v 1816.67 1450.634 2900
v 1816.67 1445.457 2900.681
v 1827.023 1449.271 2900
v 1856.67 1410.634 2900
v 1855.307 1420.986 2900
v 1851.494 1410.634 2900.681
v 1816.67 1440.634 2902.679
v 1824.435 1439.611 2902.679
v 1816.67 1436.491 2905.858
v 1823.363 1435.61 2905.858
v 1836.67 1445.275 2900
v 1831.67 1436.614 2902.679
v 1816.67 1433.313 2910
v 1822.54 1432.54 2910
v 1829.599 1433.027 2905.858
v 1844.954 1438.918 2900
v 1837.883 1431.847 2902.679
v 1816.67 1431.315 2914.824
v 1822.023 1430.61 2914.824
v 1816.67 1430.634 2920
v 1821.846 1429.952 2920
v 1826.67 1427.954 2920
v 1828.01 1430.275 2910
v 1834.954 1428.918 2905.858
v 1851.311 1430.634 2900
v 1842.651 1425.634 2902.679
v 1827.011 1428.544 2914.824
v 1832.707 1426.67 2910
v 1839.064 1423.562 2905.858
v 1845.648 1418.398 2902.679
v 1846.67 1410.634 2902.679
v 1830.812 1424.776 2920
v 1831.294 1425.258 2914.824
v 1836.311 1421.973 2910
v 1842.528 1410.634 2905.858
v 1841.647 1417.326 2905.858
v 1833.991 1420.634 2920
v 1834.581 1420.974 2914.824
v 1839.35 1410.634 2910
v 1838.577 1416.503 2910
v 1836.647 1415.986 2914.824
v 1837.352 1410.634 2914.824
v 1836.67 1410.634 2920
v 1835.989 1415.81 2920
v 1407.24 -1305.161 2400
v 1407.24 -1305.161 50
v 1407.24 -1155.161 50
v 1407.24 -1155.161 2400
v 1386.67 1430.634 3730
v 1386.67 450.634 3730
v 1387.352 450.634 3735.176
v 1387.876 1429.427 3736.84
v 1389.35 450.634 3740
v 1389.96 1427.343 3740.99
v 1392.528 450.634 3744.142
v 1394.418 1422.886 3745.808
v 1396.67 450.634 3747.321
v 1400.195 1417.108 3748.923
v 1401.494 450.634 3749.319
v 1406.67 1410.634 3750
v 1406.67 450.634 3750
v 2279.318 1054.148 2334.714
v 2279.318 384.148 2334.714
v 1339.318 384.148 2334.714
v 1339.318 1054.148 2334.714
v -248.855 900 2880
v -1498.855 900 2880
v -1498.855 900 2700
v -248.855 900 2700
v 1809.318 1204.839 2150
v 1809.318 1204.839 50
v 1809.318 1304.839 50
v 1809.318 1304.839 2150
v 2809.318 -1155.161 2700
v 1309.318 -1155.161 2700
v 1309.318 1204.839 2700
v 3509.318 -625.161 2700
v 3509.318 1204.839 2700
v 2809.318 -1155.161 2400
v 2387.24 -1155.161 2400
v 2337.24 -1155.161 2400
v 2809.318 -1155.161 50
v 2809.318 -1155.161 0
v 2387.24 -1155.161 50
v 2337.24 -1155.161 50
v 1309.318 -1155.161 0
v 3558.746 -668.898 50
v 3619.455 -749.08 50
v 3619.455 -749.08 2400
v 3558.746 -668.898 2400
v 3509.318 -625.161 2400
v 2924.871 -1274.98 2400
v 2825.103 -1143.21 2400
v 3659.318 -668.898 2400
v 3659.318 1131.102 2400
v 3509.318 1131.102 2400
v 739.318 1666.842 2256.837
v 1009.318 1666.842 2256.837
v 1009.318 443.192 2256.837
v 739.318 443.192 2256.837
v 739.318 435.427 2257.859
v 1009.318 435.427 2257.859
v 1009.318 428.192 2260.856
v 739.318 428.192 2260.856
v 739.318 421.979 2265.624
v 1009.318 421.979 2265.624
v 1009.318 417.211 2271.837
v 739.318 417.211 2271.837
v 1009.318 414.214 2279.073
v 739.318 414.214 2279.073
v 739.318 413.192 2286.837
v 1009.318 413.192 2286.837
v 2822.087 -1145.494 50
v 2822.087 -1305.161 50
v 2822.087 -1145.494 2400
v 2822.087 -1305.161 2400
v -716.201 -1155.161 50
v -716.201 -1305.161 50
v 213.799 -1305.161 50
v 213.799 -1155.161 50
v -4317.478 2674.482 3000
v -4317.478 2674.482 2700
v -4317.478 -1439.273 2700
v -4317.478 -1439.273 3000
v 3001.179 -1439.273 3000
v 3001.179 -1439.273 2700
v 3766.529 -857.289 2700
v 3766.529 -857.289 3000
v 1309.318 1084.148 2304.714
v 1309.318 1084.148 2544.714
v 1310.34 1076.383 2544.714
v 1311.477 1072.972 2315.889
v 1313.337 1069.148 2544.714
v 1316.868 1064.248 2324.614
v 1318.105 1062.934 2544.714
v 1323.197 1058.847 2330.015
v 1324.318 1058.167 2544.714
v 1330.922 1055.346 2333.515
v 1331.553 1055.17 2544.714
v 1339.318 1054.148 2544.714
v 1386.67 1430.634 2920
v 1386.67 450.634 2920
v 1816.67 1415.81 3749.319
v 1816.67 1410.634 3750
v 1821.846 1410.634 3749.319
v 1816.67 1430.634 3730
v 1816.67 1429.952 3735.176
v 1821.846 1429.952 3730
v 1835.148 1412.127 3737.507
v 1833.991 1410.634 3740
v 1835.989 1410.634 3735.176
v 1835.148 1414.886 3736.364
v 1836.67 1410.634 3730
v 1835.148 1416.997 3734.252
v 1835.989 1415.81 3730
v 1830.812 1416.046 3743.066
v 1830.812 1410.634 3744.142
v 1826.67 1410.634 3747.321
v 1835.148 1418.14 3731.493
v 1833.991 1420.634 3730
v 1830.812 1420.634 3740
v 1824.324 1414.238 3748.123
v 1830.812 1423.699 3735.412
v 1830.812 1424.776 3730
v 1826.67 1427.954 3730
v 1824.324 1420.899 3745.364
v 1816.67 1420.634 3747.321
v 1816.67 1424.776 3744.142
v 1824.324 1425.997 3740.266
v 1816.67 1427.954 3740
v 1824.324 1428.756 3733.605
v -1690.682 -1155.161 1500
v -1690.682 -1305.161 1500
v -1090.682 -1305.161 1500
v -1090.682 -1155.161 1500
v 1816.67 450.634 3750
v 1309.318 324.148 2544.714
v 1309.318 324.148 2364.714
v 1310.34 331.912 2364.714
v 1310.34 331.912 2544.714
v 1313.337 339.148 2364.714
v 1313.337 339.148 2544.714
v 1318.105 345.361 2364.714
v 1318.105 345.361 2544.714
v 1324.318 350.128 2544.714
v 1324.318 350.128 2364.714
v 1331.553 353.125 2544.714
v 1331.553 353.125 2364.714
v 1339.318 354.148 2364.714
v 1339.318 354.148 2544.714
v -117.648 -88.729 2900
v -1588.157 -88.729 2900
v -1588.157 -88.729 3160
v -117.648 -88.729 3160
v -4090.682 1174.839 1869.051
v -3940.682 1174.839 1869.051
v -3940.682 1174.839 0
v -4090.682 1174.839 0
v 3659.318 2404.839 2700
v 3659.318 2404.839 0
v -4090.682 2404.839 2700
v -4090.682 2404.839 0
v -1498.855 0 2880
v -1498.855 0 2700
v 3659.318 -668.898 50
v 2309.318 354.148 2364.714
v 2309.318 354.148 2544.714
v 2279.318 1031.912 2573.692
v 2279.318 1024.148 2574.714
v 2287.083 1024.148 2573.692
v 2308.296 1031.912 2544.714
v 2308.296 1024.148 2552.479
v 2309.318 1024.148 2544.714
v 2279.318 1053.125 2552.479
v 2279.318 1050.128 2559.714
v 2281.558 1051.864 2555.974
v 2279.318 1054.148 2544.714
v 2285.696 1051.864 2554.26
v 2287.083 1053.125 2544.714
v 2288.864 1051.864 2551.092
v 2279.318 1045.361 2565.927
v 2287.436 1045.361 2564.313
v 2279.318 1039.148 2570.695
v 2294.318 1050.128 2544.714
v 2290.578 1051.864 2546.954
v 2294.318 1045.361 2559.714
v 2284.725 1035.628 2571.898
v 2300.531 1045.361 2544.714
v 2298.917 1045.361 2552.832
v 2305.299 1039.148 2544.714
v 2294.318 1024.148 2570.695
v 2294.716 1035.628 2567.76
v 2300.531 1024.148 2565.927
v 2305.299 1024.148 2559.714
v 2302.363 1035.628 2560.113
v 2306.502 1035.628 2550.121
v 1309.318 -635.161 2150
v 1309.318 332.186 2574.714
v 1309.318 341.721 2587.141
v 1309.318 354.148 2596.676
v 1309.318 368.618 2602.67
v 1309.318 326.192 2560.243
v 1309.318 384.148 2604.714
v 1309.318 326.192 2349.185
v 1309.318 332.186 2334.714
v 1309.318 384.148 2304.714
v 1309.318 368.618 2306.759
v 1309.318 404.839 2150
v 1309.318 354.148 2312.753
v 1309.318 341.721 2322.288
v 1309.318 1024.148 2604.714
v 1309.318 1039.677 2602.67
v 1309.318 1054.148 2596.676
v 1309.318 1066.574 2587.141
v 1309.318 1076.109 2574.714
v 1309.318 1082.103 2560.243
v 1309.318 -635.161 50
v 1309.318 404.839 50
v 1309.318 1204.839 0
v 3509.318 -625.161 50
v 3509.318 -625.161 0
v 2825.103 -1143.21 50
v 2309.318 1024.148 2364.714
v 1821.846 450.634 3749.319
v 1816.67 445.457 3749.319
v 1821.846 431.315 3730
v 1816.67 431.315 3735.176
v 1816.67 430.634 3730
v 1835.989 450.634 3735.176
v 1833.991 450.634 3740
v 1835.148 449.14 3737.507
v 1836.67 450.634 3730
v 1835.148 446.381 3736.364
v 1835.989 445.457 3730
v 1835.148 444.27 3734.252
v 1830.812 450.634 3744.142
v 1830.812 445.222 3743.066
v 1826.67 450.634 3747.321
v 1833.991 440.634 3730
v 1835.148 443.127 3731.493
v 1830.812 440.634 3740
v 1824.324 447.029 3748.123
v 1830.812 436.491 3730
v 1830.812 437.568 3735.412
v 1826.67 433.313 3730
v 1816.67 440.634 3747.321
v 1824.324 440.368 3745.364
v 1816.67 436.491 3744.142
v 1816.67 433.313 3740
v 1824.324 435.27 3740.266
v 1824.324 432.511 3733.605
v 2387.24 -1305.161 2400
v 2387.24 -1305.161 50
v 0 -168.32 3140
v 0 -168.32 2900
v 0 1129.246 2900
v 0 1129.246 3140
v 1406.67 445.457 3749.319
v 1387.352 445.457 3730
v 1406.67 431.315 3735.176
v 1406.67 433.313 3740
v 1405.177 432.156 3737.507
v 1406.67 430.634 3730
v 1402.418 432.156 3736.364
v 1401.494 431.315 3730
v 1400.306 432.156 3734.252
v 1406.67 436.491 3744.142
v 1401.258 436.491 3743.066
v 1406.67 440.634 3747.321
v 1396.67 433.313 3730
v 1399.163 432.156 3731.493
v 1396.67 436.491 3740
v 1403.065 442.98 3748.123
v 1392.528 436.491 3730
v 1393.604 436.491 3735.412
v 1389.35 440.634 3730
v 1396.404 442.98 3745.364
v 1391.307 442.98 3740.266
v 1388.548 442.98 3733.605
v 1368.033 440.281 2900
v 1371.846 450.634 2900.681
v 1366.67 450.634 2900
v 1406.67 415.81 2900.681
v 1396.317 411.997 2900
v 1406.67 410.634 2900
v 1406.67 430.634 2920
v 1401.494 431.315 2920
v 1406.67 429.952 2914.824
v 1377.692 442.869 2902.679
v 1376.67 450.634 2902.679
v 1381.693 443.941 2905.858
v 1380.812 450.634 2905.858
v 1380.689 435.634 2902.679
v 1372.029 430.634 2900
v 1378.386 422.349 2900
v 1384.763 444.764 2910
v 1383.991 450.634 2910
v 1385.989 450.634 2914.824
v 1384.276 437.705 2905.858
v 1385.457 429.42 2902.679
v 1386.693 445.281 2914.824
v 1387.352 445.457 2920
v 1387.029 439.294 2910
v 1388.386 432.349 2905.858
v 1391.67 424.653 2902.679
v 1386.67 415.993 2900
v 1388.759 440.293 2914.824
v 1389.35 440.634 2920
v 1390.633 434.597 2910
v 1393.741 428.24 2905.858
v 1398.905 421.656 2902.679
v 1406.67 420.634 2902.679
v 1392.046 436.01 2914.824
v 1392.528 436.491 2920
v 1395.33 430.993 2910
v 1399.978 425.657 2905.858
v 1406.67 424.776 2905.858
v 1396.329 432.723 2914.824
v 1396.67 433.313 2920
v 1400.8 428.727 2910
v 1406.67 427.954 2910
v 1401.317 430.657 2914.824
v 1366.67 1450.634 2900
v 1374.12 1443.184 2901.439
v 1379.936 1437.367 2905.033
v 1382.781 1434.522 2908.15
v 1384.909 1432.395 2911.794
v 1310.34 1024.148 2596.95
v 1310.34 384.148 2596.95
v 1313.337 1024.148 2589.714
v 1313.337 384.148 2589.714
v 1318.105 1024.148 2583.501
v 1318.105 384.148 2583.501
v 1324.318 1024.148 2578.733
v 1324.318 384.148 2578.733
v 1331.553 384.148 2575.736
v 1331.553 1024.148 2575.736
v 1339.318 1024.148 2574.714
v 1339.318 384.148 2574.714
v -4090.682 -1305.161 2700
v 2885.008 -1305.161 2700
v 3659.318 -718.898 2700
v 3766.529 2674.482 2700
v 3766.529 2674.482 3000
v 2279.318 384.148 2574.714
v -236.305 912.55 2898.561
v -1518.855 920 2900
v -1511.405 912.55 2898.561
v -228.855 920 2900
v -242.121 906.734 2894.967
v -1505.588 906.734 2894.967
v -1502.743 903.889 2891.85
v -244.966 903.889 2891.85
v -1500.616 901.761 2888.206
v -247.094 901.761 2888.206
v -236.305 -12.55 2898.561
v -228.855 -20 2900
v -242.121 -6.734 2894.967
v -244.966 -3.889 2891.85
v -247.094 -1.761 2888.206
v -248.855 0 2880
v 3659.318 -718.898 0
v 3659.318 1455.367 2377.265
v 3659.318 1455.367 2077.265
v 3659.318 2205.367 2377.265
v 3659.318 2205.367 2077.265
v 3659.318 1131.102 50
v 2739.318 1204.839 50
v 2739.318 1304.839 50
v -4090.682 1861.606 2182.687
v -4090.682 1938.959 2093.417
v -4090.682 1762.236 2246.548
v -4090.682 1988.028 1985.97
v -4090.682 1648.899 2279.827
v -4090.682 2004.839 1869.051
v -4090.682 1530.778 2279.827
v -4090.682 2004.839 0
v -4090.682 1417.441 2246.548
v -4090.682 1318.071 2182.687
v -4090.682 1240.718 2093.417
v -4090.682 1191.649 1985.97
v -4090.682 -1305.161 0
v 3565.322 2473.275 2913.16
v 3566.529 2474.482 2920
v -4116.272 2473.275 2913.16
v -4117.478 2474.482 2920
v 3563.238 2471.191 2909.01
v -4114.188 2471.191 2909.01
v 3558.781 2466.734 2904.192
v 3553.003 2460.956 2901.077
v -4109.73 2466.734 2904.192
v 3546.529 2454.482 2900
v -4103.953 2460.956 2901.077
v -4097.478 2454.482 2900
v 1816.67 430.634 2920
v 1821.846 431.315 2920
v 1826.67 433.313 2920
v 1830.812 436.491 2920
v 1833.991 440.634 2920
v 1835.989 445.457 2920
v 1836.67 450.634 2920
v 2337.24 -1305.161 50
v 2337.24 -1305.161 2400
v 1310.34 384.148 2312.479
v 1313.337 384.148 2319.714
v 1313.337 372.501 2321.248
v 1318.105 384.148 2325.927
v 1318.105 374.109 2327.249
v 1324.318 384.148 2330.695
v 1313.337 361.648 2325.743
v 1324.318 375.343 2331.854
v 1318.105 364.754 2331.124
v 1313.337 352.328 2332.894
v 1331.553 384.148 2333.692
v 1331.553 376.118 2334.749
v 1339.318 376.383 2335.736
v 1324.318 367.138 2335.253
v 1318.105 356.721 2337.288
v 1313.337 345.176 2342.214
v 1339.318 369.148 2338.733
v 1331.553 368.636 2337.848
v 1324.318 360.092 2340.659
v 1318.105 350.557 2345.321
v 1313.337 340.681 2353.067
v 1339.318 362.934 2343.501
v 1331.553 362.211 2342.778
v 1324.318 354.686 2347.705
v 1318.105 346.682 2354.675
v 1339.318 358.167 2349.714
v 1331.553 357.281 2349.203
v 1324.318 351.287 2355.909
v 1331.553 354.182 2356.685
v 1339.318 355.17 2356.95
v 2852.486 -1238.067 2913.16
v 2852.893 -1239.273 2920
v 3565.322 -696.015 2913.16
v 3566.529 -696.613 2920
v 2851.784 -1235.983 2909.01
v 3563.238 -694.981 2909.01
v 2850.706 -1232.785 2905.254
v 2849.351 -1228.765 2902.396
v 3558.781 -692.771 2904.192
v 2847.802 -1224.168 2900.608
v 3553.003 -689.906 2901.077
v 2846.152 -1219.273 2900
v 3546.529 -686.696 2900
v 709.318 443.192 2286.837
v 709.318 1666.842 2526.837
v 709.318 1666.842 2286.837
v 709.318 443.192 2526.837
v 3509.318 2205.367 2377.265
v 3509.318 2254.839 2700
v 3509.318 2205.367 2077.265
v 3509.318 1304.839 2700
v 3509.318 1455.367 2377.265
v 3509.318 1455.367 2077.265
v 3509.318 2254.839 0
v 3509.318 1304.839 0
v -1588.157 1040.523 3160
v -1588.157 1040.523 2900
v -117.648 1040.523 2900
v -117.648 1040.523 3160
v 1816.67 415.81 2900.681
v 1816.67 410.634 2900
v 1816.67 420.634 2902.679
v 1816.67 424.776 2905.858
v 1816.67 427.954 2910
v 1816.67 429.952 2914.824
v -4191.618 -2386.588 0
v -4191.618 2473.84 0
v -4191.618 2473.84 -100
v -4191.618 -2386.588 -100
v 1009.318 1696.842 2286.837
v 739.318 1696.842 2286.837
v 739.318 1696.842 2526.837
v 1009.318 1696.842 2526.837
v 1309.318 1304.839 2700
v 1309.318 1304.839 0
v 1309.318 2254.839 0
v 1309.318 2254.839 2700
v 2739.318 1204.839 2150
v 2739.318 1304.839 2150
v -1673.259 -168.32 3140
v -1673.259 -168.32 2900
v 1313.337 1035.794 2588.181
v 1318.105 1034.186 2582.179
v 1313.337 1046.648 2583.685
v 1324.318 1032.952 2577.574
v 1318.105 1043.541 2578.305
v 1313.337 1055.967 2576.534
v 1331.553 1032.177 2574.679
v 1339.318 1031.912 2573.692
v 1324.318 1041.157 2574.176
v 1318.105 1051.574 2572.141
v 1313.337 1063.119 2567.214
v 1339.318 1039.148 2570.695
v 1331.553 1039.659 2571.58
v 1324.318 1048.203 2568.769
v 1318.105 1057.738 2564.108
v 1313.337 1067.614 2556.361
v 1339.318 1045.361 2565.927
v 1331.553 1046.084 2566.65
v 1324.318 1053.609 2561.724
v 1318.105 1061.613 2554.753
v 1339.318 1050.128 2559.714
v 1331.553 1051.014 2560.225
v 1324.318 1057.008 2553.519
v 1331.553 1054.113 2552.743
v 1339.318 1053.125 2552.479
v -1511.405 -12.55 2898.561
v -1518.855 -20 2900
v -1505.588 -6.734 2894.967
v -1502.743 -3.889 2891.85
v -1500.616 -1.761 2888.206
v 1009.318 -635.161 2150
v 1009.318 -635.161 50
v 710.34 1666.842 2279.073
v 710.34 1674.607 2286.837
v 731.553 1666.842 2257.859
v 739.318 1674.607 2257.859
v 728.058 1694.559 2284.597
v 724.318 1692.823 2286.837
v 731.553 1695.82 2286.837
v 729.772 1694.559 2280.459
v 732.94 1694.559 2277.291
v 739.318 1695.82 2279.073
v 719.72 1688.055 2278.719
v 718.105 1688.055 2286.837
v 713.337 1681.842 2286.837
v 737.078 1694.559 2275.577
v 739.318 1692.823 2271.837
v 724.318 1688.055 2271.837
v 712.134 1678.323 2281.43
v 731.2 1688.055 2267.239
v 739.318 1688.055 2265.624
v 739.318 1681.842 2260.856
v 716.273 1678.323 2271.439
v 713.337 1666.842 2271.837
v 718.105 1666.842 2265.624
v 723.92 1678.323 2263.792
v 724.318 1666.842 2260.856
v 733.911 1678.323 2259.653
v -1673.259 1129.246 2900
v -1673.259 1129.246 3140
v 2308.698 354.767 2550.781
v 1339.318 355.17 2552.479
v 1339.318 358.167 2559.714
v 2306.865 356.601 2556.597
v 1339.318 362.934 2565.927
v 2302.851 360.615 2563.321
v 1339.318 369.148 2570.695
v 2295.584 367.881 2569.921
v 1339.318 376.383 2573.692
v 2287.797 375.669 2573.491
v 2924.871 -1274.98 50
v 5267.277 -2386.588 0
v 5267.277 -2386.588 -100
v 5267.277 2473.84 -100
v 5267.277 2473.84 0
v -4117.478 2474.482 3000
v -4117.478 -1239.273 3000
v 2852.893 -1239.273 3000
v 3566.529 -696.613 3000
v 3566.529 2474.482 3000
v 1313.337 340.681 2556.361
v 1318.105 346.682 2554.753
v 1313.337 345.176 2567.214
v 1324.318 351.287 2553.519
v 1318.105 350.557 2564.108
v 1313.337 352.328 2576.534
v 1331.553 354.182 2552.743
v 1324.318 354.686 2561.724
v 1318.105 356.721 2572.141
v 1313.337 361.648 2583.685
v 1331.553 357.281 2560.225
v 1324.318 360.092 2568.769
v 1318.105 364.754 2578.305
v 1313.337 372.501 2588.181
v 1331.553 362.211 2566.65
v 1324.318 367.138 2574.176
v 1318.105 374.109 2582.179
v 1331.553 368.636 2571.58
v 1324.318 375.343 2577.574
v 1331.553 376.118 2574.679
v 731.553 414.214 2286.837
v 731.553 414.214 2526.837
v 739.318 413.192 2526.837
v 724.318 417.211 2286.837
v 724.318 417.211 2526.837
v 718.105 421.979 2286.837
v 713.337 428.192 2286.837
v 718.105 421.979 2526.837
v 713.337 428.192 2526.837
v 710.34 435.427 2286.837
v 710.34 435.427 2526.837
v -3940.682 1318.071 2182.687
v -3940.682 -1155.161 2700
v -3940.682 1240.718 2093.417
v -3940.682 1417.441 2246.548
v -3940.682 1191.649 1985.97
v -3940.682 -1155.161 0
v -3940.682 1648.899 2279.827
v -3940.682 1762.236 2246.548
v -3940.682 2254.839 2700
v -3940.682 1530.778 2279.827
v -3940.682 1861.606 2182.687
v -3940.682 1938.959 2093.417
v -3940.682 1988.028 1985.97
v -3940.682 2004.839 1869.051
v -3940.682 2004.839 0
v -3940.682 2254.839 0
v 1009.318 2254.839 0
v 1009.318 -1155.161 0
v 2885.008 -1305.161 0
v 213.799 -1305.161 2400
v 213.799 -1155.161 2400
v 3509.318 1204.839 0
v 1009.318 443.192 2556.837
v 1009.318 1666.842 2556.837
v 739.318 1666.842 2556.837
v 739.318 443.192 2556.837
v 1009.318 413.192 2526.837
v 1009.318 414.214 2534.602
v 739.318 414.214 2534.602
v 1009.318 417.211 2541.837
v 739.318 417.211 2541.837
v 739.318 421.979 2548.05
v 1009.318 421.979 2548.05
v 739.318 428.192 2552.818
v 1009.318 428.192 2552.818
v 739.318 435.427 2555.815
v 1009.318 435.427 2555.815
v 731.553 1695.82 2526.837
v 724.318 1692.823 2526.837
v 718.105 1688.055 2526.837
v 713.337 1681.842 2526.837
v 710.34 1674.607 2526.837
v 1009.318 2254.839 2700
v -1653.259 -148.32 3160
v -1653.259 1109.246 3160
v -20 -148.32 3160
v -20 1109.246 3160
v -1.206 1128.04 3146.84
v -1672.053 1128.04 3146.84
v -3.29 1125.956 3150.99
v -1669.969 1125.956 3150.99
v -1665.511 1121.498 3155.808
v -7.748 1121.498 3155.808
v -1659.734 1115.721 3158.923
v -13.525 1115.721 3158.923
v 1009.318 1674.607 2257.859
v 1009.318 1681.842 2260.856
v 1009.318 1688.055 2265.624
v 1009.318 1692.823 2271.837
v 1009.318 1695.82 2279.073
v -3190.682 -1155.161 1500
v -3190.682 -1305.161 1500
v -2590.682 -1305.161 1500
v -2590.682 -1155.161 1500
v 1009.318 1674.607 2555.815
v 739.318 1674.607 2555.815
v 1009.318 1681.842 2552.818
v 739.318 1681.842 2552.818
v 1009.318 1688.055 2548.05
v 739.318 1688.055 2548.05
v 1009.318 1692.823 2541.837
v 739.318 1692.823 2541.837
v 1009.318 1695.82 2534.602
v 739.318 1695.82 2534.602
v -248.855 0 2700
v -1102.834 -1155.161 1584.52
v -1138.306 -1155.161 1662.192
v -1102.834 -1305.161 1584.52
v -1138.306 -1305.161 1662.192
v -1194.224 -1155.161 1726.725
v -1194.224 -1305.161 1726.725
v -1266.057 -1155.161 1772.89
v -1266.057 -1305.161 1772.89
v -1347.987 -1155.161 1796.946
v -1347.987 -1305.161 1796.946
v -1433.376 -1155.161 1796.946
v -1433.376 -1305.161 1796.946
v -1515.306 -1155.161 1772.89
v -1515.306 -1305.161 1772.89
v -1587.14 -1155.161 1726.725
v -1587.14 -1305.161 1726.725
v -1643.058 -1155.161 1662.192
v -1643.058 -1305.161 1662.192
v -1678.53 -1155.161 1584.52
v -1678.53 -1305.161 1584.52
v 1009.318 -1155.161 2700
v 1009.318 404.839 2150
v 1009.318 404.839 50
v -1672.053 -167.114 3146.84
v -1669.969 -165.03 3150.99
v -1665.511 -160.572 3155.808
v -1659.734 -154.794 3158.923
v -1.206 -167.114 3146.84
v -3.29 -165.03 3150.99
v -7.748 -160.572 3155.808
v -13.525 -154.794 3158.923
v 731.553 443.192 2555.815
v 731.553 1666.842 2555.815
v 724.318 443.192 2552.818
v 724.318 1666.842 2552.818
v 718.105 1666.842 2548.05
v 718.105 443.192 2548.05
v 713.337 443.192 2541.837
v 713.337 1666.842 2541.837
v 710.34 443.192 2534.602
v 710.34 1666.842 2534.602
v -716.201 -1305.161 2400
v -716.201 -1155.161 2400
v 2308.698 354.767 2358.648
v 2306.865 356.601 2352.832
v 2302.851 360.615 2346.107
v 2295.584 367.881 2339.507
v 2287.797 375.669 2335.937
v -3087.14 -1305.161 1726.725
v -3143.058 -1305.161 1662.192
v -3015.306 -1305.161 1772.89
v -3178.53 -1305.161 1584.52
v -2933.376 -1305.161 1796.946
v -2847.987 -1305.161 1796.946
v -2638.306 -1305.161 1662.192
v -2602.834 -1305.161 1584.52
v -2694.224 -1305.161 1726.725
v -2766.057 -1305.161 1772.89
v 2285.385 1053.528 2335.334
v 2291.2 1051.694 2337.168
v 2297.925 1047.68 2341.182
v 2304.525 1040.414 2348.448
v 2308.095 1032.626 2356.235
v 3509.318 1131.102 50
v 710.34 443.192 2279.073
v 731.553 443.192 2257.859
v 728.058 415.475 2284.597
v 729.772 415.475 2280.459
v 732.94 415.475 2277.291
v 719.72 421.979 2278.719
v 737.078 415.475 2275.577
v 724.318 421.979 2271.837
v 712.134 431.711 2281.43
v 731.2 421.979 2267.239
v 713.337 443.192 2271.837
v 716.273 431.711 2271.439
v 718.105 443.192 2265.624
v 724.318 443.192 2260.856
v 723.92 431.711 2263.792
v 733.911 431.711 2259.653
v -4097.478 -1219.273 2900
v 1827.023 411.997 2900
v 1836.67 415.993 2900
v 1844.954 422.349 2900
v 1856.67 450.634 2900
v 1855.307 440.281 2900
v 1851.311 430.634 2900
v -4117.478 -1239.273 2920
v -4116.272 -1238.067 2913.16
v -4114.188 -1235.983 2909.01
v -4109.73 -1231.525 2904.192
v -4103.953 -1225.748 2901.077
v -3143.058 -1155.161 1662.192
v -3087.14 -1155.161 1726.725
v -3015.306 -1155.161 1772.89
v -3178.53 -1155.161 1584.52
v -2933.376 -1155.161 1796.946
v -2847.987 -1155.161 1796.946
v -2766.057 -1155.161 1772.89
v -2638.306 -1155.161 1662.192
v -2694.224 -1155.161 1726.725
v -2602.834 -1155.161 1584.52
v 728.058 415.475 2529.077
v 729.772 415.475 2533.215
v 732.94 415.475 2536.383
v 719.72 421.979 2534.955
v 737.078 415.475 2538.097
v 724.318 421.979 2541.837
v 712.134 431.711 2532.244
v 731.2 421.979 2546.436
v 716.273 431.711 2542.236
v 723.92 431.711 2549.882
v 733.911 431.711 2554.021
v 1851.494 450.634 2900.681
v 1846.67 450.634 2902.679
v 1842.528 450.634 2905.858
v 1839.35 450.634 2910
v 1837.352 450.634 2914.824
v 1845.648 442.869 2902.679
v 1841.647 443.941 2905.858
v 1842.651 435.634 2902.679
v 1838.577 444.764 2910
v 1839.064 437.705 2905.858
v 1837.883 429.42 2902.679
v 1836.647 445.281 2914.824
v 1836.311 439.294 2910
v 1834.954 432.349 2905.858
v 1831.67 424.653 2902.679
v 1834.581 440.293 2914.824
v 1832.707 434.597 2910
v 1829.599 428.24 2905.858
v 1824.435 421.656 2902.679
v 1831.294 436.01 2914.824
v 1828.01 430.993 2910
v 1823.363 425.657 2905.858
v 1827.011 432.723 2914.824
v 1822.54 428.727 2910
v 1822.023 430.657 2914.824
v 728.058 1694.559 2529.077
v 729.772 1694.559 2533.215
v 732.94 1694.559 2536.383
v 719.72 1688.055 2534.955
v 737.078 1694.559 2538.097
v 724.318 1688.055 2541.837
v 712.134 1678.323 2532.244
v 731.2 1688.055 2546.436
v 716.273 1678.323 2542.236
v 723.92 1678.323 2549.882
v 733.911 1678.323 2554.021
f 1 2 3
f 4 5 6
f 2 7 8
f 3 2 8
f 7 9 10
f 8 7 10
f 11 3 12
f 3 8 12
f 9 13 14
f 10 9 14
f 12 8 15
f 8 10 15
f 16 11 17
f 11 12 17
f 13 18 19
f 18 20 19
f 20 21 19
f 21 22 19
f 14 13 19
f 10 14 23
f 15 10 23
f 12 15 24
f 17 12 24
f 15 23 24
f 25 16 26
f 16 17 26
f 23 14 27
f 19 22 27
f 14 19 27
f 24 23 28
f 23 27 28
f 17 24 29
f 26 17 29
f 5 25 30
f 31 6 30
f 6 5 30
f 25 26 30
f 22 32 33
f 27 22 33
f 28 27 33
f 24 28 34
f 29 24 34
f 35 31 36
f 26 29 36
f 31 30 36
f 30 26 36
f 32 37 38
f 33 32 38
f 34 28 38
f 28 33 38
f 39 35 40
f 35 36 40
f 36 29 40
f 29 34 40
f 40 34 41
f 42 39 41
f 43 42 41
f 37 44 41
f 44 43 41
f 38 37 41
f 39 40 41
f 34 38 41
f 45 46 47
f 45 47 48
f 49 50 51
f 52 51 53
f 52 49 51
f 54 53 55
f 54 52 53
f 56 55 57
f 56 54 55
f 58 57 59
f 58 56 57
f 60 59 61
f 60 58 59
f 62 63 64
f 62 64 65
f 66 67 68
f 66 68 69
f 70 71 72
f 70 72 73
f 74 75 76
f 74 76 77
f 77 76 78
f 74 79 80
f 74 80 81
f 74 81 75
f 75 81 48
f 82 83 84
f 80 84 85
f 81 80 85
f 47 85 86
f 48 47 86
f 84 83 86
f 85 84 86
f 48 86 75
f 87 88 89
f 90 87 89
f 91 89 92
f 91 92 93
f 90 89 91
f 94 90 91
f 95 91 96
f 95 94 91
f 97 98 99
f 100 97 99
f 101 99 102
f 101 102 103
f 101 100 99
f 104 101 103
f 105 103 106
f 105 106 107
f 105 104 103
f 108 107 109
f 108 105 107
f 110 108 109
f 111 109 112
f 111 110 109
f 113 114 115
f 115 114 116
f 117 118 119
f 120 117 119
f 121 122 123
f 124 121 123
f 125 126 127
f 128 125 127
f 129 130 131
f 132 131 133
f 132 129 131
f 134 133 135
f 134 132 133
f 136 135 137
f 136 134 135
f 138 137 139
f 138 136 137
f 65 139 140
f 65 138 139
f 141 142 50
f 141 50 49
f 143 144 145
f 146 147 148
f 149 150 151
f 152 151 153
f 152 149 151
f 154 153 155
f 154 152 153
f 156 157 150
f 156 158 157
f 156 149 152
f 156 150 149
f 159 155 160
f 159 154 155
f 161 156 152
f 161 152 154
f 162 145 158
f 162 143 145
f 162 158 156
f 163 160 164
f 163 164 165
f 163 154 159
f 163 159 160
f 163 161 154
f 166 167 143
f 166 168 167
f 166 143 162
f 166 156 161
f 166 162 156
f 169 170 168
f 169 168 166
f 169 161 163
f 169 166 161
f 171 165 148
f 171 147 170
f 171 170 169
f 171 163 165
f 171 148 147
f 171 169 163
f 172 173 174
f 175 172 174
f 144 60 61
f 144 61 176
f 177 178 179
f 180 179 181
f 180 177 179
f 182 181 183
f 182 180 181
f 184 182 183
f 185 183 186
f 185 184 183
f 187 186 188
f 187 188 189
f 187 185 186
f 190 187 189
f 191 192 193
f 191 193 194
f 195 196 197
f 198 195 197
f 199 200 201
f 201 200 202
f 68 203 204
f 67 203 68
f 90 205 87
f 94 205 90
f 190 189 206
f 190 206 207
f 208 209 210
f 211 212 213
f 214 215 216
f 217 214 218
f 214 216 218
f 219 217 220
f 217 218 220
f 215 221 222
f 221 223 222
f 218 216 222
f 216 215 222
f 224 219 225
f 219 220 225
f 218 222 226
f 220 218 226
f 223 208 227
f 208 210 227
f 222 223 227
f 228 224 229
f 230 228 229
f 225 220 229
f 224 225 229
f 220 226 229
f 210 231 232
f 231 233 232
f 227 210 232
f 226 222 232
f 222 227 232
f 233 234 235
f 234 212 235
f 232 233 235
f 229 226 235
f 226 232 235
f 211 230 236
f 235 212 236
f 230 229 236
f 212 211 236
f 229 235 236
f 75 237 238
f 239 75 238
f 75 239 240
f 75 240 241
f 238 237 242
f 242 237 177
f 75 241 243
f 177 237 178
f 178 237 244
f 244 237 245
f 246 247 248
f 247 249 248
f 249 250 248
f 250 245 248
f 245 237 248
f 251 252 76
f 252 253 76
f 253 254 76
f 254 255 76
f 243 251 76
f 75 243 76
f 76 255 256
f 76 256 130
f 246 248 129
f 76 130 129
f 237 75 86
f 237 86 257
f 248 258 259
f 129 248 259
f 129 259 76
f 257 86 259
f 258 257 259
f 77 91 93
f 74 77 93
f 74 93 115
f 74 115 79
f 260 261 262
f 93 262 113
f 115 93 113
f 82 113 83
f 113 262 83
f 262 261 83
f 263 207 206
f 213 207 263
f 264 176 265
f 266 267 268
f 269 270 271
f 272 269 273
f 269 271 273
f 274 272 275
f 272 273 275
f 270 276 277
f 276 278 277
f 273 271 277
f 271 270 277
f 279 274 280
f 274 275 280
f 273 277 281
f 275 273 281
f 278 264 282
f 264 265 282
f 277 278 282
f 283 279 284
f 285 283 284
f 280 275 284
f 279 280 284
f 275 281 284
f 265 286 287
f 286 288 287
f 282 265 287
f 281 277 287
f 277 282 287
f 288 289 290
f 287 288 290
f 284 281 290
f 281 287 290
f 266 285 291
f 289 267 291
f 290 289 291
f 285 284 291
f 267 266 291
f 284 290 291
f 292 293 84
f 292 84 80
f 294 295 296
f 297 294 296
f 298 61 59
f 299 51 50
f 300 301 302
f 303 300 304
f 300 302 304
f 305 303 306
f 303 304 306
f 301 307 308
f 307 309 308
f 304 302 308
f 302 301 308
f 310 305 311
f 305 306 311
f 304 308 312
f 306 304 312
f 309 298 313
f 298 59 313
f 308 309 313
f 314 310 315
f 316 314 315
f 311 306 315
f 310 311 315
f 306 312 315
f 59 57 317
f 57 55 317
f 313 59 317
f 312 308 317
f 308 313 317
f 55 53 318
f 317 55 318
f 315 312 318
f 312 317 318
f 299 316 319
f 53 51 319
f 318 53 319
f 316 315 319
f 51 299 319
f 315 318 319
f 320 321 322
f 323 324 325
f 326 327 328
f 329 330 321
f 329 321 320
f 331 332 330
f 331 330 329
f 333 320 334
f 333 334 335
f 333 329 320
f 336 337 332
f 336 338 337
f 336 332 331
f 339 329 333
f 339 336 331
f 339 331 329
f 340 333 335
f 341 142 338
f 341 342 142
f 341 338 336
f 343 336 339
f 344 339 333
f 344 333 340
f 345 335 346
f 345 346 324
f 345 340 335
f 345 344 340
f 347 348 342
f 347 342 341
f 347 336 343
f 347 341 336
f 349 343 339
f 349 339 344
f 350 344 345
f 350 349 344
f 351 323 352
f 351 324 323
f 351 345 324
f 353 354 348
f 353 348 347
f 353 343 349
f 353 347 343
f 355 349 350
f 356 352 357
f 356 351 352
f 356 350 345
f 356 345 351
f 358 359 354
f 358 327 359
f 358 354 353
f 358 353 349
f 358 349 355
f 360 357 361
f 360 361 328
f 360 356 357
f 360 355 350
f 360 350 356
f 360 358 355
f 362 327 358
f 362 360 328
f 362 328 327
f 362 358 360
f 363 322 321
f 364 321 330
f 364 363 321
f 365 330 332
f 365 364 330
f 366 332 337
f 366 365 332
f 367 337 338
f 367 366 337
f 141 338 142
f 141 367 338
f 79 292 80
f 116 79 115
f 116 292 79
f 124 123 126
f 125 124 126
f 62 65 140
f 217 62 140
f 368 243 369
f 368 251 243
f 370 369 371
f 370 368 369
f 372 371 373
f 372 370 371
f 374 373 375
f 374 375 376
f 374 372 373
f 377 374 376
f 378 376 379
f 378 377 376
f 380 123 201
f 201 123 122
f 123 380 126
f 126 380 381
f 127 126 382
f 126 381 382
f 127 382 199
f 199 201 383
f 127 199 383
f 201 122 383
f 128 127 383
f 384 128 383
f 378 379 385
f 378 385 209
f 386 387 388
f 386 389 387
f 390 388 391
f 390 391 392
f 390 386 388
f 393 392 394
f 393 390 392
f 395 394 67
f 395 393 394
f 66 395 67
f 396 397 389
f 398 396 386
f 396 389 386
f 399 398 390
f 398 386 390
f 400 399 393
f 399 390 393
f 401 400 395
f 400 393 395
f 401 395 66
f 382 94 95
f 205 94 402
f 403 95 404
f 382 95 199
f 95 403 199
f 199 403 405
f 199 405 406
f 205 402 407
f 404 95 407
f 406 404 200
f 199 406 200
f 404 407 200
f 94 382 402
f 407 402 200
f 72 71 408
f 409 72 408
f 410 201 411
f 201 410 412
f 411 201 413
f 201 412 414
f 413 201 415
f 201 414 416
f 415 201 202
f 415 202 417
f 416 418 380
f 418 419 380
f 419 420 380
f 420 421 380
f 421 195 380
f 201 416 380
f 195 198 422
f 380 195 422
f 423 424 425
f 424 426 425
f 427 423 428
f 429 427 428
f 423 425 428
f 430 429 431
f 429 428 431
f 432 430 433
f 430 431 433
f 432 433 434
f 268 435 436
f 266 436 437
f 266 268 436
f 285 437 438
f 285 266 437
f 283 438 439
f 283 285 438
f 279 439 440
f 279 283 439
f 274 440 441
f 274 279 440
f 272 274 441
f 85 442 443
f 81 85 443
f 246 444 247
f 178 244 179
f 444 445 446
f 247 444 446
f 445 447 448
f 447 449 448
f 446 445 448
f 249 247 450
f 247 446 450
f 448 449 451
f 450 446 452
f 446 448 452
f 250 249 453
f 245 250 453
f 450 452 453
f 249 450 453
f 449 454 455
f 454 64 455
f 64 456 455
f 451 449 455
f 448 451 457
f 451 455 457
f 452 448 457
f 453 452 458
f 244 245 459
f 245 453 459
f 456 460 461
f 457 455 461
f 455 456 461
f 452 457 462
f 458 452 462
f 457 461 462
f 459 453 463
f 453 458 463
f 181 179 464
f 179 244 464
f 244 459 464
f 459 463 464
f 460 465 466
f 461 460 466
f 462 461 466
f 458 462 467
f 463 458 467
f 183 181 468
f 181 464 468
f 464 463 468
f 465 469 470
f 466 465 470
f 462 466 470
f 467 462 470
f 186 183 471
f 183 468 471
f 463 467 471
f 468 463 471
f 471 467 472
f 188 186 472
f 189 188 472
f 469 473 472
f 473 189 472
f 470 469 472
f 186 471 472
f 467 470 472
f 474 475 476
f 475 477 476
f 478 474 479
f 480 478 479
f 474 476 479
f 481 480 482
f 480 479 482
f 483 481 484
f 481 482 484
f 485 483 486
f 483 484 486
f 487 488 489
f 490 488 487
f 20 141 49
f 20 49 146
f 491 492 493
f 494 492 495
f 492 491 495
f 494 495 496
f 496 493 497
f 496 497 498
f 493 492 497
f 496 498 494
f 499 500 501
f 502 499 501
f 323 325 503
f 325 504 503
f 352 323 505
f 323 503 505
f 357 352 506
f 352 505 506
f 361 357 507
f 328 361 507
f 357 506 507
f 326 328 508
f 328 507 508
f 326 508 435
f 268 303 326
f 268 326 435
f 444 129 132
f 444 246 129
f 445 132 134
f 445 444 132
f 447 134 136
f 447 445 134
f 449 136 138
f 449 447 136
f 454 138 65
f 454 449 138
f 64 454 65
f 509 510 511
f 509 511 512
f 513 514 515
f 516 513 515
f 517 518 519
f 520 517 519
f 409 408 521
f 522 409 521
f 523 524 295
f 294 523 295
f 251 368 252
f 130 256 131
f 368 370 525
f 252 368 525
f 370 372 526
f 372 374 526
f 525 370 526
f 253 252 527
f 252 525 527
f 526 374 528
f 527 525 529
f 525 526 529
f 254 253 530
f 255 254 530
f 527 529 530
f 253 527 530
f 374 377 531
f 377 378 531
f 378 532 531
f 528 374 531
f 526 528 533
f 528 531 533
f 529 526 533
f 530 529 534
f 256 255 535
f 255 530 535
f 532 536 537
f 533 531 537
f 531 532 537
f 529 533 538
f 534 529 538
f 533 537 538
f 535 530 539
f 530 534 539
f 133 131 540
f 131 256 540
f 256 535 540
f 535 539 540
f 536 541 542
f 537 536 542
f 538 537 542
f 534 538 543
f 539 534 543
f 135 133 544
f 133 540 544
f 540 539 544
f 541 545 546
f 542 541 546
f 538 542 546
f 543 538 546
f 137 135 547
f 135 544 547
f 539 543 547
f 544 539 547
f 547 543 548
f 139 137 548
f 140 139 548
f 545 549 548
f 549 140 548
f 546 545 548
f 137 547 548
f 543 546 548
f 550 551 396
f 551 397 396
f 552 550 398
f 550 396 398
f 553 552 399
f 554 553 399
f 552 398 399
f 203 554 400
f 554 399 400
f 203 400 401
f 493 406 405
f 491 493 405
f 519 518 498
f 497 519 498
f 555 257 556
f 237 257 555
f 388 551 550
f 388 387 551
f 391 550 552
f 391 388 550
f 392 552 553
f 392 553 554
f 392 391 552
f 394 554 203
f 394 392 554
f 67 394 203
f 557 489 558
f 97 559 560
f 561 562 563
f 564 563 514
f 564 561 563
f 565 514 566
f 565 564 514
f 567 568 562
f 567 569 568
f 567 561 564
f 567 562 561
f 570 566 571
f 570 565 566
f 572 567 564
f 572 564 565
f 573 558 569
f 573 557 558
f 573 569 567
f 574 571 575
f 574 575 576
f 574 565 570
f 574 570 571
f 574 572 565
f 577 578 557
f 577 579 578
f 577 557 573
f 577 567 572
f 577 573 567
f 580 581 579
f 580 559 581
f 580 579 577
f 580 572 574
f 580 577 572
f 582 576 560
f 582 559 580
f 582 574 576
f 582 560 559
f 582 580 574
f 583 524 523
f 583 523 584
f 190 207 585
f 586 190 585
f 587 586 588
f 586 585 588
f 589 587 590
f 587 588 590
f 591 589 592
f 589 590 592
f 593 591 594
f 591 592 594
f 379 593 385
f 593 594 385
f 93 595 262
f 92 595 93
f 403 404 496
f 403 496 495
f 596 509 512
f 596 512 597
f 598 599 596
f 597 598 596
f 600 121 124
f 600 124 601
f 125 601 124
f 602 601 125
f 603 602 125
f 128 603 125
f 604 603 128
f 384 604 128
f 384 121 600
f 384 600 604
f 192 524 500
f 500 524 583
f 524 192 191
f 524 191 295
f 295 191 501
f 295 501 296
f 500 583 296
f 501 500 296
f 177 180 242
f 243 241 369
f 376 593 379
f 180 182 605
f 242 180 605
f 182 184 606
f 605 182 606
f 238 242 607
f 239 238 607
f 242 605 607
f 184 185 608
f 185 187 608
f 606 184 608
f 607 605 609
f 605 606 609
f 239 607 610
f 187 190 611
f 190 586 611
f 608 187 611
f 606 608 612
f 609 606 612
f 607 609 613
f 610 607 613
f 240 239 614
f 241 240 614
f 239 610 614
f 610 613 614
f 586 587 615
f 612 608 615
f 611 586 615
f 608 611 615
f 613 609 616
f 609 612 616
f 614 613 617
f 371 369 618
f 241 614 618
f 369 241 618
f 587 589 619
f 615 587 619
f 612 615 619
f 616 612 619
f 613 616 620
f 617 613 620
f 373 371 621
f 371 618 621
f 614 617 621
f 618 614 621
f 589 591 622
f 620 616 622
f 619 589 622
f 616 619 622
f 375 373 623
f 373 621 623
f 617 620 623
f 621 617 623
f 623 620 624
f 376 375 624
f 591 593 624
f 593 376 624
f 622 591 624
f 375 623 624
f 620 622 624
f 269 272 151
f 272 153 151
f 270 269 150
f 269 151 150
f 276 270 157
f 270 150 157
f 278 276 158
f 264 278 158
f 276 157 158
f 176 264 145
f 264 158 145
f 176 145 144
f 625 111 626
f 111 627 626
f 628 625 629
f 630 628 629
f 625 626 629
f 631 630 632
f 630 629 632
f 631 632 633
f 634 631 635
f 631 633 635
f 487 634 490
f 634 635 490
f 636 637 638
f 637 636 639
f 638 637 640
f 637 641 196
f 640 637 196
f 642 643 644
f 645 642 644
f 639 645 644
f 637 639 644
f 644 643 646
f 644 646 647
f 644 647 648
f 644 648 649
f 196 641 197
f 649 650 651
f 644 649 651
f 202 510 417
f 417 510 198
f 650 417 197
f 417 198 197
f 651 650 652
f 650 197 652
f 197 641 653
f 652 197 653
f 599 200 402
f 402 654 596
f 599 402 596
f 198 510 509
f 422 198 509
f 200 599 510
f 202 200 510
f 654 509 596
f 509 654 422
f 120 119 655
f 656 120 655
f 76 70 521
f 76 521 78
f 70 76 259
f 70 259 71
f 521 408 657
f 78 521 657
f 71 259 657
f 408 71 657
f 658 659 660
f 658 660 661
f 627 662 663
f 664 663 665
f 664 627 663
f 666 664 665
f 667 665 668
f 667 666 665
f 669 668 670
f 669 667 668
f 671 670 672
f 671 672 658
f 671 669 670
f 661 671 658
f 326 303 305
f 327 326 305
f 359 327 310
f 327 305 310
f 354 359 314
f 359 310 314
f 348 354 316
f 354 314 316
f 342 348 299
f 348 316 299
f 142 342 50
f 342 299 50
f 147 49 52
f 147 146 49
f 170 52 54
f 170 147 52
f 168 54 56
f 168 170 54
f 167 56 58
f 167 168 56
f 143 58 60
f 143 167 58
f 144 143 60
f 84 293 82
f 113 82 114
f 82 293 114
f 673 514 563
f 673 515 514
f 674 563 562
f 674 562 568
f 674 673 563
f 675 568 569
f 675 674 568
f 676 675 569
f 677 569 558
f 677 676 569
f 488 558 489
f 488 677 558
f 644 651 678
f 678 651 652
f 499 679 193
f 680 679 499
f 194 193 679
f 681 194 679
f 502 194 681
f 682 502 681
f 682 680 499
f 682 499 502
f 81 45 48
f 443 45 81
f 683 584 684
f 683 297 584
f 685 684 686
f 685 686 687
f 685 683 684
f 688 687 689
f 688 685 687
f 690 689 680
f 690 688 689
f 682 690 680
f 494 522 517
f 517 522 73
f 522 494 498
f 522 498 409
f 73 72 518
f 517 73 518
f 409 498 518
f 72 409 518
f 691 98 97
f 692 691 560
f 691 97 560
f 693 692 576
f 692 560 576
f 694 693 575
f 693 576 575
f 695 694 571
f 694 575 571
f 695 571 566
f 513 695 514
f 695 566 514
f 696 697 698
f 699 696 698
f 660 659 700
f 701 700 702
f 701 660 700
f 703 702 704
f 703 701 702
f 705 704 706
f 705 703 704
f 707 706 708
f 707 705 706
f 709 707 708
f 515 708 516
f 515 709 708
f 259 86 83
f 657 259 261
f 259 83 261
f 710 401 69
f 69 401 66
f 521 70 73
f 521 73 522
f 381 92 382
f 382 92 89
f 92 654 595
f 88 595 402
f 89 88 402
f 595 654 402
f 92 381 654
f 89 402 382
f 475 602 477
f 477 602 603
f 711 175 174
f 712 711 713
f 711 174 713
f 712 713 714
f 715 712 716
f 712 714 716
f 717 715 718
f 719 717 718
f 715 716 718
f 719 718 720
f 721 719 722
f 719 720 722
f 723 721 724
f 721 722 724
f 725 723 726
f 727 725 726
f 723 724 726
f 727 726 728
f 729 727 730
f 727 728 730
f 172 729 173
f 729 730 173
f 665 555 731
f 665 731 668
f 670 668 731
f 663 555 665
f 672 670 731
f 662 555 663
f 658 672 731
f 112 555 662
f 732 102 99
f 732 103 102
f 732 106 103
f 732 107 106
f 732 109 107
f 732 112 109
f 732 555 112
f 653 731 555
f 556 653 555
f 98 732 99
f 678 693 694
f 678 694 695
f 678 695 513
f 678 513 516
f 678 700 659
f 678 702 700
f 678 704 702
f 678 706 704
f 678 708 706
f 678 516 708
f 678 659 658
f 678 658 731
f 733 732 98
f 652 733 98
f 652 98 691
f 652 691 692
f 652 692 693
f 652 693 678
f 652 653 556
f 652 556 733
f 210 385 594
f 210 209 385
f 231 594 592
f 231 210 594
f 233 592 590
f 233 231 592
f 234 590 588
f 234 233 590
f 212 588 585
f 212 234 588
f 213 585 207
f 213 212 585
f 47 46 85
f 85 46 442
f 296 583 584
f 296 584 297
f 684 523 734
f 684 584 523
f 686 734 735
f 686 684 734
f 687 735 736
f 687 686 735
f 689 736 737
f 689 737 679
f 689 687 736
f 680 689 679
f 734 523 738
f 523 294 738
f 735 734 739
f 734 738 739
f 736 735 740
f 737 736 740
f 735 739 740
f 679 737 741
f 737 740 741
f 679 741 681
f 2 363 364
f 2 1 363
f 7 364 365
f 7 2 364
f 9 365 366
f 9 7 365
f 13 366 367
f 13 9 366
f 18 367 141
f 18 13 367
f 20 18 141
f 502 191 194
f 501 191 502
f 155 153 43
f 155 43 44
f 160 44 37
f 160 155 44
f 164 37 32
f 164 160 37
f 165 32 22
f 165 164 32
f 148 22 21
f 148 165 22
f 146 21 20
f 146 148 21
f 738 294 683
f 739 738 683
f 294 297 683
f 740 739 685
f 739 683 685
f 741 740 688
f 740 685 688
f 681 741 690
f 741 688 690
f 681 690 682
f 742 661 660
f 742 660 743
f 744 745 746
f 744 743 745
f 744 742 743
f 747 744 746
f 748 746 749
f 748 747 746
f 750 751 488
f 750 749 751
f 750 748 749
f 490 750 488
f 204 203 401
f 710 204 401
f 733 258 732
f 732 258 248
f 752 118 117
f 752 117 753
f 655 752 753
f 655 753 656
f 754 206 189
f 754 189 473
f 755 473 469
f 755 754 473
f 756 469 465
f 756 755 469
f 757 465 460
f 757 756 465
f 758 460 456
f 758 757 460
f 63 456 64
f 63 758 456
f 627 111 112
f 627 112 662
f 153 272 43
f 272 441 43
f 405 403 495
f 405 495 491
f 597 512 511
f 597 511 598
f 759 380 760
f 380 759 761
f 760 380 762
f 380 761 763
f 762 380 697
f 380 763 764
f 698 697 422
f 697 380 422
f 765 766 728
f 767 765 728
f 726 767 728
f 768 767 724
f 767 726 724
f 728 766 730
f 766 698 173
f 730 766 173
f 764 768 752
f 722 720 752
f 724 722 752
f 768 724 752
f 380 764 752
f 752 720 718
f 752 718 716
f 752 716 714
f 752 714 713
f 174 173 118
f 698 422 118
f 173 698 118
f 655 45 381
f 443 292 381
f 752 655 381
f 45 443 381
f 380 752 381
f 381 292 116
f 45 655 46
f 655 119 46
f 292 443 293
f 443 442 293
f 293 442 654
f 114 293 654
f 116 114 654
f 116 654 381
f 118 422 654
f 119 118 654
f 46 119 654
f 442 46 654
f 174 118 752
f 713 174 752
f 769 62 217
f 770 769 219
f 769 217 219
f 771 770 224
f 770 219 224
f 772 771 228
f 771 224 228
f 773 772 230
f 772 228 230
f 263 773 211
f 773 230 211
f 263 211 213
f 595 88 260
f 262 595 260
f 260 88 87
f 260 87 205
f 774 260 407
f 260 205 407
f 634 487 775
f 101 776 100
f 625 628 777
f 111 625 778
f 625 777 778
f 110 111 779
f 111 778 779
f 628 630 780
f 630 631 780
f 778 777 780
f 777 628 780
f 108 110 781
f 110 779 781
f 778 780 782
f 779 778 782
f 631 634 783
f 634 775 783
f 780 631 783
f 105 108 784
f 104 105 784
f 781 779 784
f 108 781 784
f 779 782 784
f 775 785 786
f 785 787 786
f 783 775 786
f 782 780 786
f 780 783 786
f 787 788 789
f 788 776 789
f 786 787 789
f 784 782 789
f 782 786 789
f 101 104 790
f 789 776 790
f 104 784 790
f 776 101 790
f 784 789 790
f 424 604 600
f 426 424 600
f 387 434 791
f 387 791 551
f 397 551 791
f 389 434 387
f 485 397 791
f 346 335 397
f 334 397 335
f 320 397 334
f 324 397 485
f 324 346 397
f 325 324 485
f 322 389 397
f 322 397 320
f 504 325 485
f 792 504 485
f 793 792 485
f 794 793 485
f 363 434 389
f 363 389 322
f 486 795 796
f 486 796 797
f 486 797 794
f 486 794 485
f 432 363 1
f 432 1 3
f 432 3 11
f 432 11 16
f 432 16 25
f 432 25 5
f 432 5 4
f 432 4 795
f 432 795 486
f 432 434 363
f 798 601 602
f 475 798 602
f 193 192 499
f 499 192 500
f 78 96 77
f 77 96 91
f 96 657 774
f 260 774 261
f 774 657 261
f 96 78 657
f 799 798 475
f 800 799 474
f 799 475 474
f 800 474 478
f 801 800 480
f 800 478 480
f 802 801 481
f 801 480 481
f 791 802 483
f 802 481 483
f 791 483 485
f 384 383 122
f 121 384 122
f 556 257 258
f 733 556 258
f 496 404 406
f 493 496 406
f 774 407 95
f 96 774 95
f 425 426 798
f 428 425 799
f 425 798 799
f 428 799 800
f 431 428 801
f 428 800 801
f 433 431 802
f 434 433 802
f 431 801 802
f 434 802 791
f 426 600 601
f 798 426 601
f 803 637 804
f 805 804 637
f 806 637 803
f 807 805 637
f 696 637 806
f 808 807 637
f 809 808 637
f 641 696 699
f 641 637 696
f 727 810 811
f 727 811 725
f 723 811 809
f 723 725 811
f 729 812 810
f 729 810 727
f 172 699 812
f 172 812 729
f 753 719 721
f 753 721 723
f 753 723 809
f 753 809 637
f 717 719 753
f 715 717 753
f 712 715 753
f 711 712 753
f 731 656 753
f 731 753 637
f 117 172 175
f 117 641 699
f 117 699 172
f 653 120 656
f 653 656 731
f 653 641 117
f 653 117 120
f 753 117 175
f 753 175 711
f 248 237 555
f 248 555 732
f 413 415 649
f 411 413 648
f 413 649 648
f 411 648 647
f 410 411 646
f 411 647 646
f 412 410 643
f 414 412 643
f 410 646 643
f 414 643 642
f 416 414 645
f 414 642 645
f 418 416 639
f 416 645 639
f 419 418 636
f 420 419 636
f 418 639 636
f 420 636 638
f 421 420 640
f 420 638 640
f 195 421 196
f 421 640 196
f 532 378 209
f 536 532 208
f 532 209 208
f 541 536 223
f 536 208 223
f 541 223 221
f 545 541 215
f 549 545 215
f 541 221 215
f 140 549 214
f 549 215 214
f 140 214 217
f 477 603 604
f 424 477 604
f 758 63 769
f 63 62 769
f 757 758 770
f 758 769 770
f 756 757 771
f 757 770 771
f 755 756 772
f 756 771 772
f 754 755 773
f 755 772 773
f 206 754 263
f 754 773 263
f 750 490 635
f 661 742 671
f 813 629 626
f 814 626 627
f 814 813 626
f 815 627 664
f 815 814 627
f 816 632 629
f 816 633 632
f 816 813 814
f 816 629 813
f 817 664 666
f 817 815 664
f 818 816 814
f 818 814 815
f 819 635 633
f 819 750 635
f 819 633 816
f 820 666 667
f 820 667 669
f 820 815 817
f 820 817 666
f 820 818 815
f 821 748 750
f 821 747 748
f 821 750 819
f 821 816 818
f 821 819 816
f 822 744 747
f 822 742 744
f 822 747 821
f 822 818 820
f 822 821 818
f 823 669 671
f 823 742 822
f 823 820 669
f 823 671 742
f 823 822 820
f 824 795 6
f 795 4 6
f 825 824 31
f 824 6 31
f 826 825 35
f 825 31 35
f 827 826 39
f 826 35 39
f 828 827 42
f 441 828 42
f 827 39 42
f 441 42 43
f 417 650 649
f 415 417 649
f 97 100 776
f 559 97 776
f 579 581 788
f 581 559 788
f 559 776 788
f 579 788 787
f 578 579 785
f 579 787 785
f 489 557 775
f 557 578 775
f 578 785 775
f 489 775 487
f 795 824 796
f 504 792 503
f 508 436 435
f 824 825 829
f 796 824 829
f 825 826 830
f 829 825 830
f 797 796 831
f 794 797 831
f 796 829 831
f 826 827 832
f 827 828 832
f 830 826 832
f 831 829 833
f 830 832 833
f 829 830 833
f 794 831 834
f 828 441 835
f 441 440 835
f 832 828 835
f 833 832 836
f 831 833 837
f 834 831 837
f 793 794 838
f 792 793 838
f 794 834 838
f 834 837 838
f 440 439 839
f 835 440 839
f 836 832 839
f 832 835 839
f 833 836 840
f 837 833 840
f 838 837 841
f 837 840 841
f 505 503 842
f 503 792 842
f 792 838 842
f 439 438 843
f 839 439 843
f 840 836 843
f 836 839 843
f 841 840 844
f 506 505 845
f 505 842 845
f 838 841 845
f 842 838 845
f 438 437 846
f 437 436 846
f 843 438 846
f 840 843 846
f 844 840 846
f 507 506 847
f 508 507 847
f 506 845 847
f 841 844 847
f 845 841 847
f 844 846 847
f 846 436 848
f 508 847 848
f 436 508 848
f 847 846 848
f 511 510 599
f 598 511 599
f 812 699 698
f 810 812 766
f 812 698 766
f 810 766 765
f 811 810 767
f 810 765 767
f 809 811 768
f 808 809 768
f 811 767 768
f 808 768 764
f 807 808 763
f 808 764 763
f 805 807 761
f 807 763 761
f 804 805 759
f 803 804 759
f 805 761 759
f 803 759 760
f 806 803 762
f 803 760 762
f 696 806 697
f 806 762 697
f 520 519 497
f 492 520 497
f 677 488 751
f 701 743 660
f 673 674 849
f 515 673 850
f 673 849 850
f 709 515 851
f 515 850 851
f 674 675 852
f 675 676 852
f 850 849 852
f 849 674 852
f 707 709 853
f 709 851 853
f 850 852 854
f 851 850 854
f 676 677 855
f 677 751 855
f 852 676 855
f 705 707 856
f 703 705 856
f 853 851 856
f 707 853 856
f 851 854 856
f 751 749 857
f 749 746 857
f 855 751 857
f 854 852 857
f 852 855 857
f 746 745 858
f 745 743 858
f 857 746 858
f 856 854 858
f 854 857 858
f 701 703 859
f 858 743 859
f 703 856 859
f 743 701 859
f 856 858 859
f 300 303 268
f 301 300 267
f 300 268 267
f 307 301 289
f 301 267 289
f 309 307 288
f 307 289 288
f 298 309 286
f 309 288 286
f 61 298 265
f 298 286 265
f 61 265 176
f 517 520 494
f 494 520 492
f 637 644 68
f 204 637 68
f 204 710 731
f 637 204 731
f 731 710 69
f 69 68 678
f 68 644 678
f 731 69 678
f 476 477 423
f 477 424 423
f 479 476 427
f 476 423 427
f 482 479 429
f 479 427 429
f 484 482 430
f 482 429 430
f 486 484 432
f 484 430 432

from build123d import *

# Parameters (mm, degrees)
F0_W      = 4950
F0_H      = 3410
F1_DEPTH  = 2700
F2_W      = 930
F2_H      = 2350
F2_W_2    = 434.8470163345
F3_DEPTH  = 159.6687643912
F4_W      = 871.2163103569
F4_H      = 2350
F5_DEPTH  = 182.4564089349
F6_W      = 1800
F6_H      = 2350
F7_DEPTH  = 150
F8_W      = 1040
F8_H      = 2100
F9_DEPTH  = 300
F11_DEPTH = 150
F12_W     = 930
F12_H     = 2100
F13_DEPTH = 100
F14_W     = 700
F14_H     = 240
F15_DEPTH = 1000
F16_W     = 1283.650457859
F16_H     = 300
F17_DEPTH = 300
F18_W     = 9458.89544487
F18_H     = 4860.4282140732
F19_DEPTH = 100
F20_W     = 750
F20_H     = 300
F21_DEPTH = 150
F22_F1_R  = 30
F22_F2_R  = 30
F23_R     = 30
F25_DEPTH = 300
F27_DEPTH = 100
F28_W     = 450
F28_H     = 1000
F29_DEPTH = 850
F32_W     = 1250
F32_H     = 900
F33_DEPTH = 200
F34_W     = 1673.2589006424
F34_H     = 1297.5656241179
F34_W_2   = 1470.5094099045
F34_H_2   = 1129.2519643903
F35_DEPTH = 260
F36_R     = 20
F36_2_R   = 20


# Not quite as in the source:
# - a feature names something its author has since deleted; it is built from what else it names
# - the program builds the solid bodies; features that only make, move or delete a surface that nothing else refers to are left out


with BuildPart() as f1:
    # F0 (on Top) → F1 (new body)
    with BuildSketch(Plane.XY):
        Polygon((-4090.6819343567, 2404.8385477066), (-4090.6819343567, -1305.1614522934), (2885.0078582764, -1305.1614522934), (3659.3180656433, -718.8980095727), (3659.3180656433, 2404.8385477066), align=None)
        with Locations((-1465.6819343567, 549.8385477066)):
            Rectangle(F0_W, F0_H, mode=Mode.SUBTRACT)
        Polygon((1309.3180656433, 1304.8385477066), (1309.3180656433, 2254.8385477066), (3509.3180656433, 2254.8385477066), (3509.3180656433, 1304.8385477066), (3509.3180656433, 1204.8385477066), (3509.3180656433, -625.1614522934), (2809.3180656433, -1155.1614522934), (1309.3180656433, -1155.1614522934), (1309.3180656433, 1204.8385477066), align=None, mode=Mode.SUBTRACT)
        Polygon((1809.3180656433, 1304.8385477066), (1309.3180656433, 1304.8385477066), (1309.3180656433, 1204.8385477066), (1809.3180656433, 1204.8385477066), (3509.3180656433, 1204.8385477066), (3509.3180656433, 1304.8385477066), align=None)
    extrude(amount=F1_DEPTH)

    # F2 (on face) → F3 (cut, through all)
    with BuildSketch(Plane.XZ.offset(1305.1614522934)):
        with BuildLine():
            Line((-1690.6819343567, 1500), (-1090.6819343567, 1500))
            ThreePointArc((-1090.6819343567, 1500), (-1390.6819343567, 1800), (-1690.6819343567, 1500))
        make_face()
        with BuildLine():
            Line((-3190.6819343567, 1500), (-2590.6819343567, 1500))
            ThreePointArc((-2590.6819343567, 1500), (-2890.6819343567, 1800), (-3190.6819343567, 1500))
        make_face()
        with Locations((-251.2006497383, 1225)):
            Rectangle(F2_W, F2_H)
        with Locations((2604.6633028984, 1225)):
            Rectangle(F2_W_2, F2_H)
        with Locations((1872.2397947311, 1225)):
            Rectangle(F2_W, F2_H)
    extrude(amount=-F3_DEPTH, mode=Mode.SUBTRACT)

    # F4 (on face) → F5 (cut, through all)
    with BuildSketch(Plane(origin=(1679.3534909725, -2218.0140446806, 0), x_dir=(0.7972582411, 0.6036383826, 0), z_dir=(0.6036383826, -0.7972582411, 0))):
        with Locations((1997.8588978885, 1225)):
            Rectangle(F4_W, F4_H)
    extrude(amount=-F5_DEPTH, mode=Mode.SUBTRACT)

    # F6 (on face) → F7 (cut, through all)
    with BuildSketch(Plane.YZ.offset(3659.3180656433)):
        with Locations((231.1019904273, 1225)):
            Rectangle(F6_W, F6_H)
    extrude(amount=-F7_DEPTH, mode=Mode.SUBTRACT)

    # F8 (on face) → F9 (cut, through all)
    with BuildSketch(Plane.YZ.offset(1309.3180656433)):
        with Locations((-115.1614522934, 1100)):
            Rectangle(F8_W, F8_H)
    extrude(amount=-F9_DEPTH, mode=Mode.SUBTRACT)

    # F10 (on face) → F11 (cut, through all)
    with BuildSketch(Plane.YZ.offset(-3940.6819343567)):
        with BuildLine():
            Line((1174.8385477066, 1869.0512180328), (1174.8385477066, 0))
            Line((1174.8385477066, 0), (2004.8385477066, 0))
            Line((2004.8385477066, 0), (2004.8385477066, 1869.0512180328))
            ThreePointArc((2004.8385477066, 1869.0512180328), (1589.8385477066, 2284.0512180328), (1174.8385477066, 1869.0512180328))
        make_face()
    extrude(amount=-F11_DEPTH, mode=Mode.SUBTRACT)

    # F12 (on face) → F13 (cut, through all)
    with BuildSketch(Plane.XZ.offset(-1204.8385477066)):
        with Locations((2274.3180656433, 1100)):
            Rectangle(F12_W, F12_H)
    extrude(amount=-F13_DEPTH, mode=Mode.SUBTRACT)

    # F14 (on face) → F15 (join)
    with BuildSketch(Plane.YZ.offset(1309.3180656433)):
        with Locations((704.1475236416, 2454.7141838074)):
            Rectangle(F14_W, F14_H)
    extrude(amount=F15_DEPTH)

    # F16 (on face) → F17 (join)
    with BuildSketch(Plane(origin=(1009.3180656433, 0, 0), x_dir=(0, -1, 0), z_dir=(-1, 0, 0))):
        with Locations((-1055.016964674, 2406.8371295929)):
            Rectangle(F16_W, F16_H)
    extrude(amount=F17_DEPTH)

    # F18 (on face) → F19 (join)
    with BuildSketch(Plane(origin=(0, 0, 0), x_dir=(1, 0, 0), z_dir=(0, 0, -1))):
        with Locations((537.8292798996, -43.6263680458)):
            Rectangle(F18_W, F18_H)
    extrude(amount=F19_DEPTH)

    # F20 (on face) → F21 (cut, through all)
    with BuildSketch(Plane.YZ.offset(3659.3180656433)):
        with Locations((1830.3670287132, 2227.2648965423)):
            Rectangle(F20_W, F20_H)
    extrude(amount=-F21_DEPTH, mode=Mode.SUBTRACT)

    # F22: fillet of radius 30 on 7 edges, made by hand

    # F22_f1
    f22_f1_edges = [f1.edges().sort_by_distance(p)[0] for p in [
        (1809.3180656433, 354.1475236416, 2574.7141838074),
        (1809.3180656433, 354.1475236416, 2334.7141838074),
        (2309.3180656433, 704.1475236416, 2574.7141838074),
        (2309.3180656433, 704.1475236416, 2334.7141838074),
        (1809.3180656433, 1054.1475236416, 2574.7141838074),
        (2309.3180656433, 1054.1475236416, 2454.7141838074),
    ]]
    fillet(f22_f1_edges, radius=F22_F1_R)

    # F22_f2
    f22_f2_edges = [f1.edges().sort_by_distance(p)[0] for p in [
        (1309.3180656433, 704.1475236416, 2574.7141838074),
        (1309.3180656433, 1045.3607270772, 2565.927387243),
        (1309.3180656433, 362.934320206, 2565.927387243),
    ]]
    fillet(f22_f2_edges, radius=F22_F2_R)

    # F23
    f23_edges = [f1.edges().sort_by_distance(p)[0] for p in [
        (709.318066, 1055.016965, 2556.83713),
        (709.318066, 1055.016965, 2256.83713),
        (709.318066, 1696.842194, 2406.83713),
        (709.318066, 413.191736, 2406.83713),
        (859.318066, 413.191736, 2556.83713),
        (859.318066, 413.191736, 2256.83713),
        (859.318066, 1696.842194, 2556.83713),
        (859.318066, 1696.842194, 2256.83713),
    ]]
    fillet(f23_edges, radius=F23_R)

    # F24 (on face) → F25 (join)
    with BuildSketch(Plane.XY.offset(2700)):
        Polygon((3766.5286064148, 2674.4816303253), (-4317.4781799316, 2674.4816303253), (-4317.4781799316, -1439.2734766006), (3001.1787414551, -1439.2734766006), (3766.5286064148, -857.2887182236), align=None)
    extrude(amount=F25_DEPTH)

    # F26 (on face) → F27 (cut)
    with BuildSketch(Plane.XY.offset(3000)):
        Polygon((3566.5286064148, 2474.4816303253), (-4117.4781799316, 2474.4816303253), (-4117.4781799316, -1239.2734766006), (1505.6841762793, -1239.2734766006), (2852.8926372528, -1239.2734766006), (3566.5286064148, -696.6128241371), align=None)
    extrude(amount=-F27_DEPTH, mode=Mode.SUBTRACT)

    # F28 (on face) → F29 (join)
    with BuildSketch(Plane.XY.offset(2900)):
        with Locations((1611.6700674257, 930.6335590078)):
            Rectangle(F28_W, F28_H)
    extrude(amount=F29_DEPTH)

    # F32 (on face) → F33 (cut, through all)
    with BuildSketch(Plane.XY.offset(2900)):
        with Locations((-873.8545744768, 450)):
            Rectangle(F32_W, F32_H)
    extrude(amount=-F33_DEPTH, mode=Mode.SUBTRACT)

    # F36
    f36_edges = [f1.edges().sort_by_distance(p)[0] for p in [
        (1386.670067, 930.633559, 3750),
        (1611.670067, 430.633559, 3750),
        (1611.670067, 1430.633559, 3750),
        (1836.670067, 930.633559, 3750),
        (1836.670067, 430.633559, 3325),
        (1386.670067, 430.633559, 3325),
        (1836.670067, 1430.633559, 3325),
        (3566.528606, 888.934403, 2900),
        (3209.710622, -967.94315, 2900),
        (-275.474787, 2474.48163, 2900),
        (-632.292771, -1239.273477, 2900),
        (-4117.47818, 617.604077, 2900),
        (-873.854574, 900, 2900),
        (-1498.854574, 450, 2900),
        (-873.854574, 0, 2900),
        (-248.854574, 450, 2900),
        (1611.670067, 1430.633559, 2900),
        (1836.670067, 930.633559, 2900),
        (1386.670067, 930.633559, 2900),
        (1611.670067, 430.633559, 2900),
    ]]
    fillet(f36_edges, radius=F36_R)


with BuildPart() as f35:
    # F34 (on face) → F35 (new body)
    with BuildSketch(Plane.XY.offset(2900)):
        with Locations((-836.6294503212, 480.463065207)):
            Rectangle(F34_W, F34_H)
        with Locations((-852.9023528099, 475.8974276483)):
            Rectangle(F34_W_2, F34_H_2, mode=Mode.SUBTRACT)
    extrude(amount=F35_DEPTH)

    # F36#2
    f36_2_edges = [f35.edges().sort_by_distance(p)[0] for p in [
        (0, 480.463065, 3160),
        (-836.62945, -168.319747, 3160),
        (-836.62945, 1129.245877, 3160),
        (-1673.258901, 480.463065, 3160),
    ]]
    fillet(f36_2_edges, radius=F36_2_R)


solid = Compound([f1.part, f35.part])
